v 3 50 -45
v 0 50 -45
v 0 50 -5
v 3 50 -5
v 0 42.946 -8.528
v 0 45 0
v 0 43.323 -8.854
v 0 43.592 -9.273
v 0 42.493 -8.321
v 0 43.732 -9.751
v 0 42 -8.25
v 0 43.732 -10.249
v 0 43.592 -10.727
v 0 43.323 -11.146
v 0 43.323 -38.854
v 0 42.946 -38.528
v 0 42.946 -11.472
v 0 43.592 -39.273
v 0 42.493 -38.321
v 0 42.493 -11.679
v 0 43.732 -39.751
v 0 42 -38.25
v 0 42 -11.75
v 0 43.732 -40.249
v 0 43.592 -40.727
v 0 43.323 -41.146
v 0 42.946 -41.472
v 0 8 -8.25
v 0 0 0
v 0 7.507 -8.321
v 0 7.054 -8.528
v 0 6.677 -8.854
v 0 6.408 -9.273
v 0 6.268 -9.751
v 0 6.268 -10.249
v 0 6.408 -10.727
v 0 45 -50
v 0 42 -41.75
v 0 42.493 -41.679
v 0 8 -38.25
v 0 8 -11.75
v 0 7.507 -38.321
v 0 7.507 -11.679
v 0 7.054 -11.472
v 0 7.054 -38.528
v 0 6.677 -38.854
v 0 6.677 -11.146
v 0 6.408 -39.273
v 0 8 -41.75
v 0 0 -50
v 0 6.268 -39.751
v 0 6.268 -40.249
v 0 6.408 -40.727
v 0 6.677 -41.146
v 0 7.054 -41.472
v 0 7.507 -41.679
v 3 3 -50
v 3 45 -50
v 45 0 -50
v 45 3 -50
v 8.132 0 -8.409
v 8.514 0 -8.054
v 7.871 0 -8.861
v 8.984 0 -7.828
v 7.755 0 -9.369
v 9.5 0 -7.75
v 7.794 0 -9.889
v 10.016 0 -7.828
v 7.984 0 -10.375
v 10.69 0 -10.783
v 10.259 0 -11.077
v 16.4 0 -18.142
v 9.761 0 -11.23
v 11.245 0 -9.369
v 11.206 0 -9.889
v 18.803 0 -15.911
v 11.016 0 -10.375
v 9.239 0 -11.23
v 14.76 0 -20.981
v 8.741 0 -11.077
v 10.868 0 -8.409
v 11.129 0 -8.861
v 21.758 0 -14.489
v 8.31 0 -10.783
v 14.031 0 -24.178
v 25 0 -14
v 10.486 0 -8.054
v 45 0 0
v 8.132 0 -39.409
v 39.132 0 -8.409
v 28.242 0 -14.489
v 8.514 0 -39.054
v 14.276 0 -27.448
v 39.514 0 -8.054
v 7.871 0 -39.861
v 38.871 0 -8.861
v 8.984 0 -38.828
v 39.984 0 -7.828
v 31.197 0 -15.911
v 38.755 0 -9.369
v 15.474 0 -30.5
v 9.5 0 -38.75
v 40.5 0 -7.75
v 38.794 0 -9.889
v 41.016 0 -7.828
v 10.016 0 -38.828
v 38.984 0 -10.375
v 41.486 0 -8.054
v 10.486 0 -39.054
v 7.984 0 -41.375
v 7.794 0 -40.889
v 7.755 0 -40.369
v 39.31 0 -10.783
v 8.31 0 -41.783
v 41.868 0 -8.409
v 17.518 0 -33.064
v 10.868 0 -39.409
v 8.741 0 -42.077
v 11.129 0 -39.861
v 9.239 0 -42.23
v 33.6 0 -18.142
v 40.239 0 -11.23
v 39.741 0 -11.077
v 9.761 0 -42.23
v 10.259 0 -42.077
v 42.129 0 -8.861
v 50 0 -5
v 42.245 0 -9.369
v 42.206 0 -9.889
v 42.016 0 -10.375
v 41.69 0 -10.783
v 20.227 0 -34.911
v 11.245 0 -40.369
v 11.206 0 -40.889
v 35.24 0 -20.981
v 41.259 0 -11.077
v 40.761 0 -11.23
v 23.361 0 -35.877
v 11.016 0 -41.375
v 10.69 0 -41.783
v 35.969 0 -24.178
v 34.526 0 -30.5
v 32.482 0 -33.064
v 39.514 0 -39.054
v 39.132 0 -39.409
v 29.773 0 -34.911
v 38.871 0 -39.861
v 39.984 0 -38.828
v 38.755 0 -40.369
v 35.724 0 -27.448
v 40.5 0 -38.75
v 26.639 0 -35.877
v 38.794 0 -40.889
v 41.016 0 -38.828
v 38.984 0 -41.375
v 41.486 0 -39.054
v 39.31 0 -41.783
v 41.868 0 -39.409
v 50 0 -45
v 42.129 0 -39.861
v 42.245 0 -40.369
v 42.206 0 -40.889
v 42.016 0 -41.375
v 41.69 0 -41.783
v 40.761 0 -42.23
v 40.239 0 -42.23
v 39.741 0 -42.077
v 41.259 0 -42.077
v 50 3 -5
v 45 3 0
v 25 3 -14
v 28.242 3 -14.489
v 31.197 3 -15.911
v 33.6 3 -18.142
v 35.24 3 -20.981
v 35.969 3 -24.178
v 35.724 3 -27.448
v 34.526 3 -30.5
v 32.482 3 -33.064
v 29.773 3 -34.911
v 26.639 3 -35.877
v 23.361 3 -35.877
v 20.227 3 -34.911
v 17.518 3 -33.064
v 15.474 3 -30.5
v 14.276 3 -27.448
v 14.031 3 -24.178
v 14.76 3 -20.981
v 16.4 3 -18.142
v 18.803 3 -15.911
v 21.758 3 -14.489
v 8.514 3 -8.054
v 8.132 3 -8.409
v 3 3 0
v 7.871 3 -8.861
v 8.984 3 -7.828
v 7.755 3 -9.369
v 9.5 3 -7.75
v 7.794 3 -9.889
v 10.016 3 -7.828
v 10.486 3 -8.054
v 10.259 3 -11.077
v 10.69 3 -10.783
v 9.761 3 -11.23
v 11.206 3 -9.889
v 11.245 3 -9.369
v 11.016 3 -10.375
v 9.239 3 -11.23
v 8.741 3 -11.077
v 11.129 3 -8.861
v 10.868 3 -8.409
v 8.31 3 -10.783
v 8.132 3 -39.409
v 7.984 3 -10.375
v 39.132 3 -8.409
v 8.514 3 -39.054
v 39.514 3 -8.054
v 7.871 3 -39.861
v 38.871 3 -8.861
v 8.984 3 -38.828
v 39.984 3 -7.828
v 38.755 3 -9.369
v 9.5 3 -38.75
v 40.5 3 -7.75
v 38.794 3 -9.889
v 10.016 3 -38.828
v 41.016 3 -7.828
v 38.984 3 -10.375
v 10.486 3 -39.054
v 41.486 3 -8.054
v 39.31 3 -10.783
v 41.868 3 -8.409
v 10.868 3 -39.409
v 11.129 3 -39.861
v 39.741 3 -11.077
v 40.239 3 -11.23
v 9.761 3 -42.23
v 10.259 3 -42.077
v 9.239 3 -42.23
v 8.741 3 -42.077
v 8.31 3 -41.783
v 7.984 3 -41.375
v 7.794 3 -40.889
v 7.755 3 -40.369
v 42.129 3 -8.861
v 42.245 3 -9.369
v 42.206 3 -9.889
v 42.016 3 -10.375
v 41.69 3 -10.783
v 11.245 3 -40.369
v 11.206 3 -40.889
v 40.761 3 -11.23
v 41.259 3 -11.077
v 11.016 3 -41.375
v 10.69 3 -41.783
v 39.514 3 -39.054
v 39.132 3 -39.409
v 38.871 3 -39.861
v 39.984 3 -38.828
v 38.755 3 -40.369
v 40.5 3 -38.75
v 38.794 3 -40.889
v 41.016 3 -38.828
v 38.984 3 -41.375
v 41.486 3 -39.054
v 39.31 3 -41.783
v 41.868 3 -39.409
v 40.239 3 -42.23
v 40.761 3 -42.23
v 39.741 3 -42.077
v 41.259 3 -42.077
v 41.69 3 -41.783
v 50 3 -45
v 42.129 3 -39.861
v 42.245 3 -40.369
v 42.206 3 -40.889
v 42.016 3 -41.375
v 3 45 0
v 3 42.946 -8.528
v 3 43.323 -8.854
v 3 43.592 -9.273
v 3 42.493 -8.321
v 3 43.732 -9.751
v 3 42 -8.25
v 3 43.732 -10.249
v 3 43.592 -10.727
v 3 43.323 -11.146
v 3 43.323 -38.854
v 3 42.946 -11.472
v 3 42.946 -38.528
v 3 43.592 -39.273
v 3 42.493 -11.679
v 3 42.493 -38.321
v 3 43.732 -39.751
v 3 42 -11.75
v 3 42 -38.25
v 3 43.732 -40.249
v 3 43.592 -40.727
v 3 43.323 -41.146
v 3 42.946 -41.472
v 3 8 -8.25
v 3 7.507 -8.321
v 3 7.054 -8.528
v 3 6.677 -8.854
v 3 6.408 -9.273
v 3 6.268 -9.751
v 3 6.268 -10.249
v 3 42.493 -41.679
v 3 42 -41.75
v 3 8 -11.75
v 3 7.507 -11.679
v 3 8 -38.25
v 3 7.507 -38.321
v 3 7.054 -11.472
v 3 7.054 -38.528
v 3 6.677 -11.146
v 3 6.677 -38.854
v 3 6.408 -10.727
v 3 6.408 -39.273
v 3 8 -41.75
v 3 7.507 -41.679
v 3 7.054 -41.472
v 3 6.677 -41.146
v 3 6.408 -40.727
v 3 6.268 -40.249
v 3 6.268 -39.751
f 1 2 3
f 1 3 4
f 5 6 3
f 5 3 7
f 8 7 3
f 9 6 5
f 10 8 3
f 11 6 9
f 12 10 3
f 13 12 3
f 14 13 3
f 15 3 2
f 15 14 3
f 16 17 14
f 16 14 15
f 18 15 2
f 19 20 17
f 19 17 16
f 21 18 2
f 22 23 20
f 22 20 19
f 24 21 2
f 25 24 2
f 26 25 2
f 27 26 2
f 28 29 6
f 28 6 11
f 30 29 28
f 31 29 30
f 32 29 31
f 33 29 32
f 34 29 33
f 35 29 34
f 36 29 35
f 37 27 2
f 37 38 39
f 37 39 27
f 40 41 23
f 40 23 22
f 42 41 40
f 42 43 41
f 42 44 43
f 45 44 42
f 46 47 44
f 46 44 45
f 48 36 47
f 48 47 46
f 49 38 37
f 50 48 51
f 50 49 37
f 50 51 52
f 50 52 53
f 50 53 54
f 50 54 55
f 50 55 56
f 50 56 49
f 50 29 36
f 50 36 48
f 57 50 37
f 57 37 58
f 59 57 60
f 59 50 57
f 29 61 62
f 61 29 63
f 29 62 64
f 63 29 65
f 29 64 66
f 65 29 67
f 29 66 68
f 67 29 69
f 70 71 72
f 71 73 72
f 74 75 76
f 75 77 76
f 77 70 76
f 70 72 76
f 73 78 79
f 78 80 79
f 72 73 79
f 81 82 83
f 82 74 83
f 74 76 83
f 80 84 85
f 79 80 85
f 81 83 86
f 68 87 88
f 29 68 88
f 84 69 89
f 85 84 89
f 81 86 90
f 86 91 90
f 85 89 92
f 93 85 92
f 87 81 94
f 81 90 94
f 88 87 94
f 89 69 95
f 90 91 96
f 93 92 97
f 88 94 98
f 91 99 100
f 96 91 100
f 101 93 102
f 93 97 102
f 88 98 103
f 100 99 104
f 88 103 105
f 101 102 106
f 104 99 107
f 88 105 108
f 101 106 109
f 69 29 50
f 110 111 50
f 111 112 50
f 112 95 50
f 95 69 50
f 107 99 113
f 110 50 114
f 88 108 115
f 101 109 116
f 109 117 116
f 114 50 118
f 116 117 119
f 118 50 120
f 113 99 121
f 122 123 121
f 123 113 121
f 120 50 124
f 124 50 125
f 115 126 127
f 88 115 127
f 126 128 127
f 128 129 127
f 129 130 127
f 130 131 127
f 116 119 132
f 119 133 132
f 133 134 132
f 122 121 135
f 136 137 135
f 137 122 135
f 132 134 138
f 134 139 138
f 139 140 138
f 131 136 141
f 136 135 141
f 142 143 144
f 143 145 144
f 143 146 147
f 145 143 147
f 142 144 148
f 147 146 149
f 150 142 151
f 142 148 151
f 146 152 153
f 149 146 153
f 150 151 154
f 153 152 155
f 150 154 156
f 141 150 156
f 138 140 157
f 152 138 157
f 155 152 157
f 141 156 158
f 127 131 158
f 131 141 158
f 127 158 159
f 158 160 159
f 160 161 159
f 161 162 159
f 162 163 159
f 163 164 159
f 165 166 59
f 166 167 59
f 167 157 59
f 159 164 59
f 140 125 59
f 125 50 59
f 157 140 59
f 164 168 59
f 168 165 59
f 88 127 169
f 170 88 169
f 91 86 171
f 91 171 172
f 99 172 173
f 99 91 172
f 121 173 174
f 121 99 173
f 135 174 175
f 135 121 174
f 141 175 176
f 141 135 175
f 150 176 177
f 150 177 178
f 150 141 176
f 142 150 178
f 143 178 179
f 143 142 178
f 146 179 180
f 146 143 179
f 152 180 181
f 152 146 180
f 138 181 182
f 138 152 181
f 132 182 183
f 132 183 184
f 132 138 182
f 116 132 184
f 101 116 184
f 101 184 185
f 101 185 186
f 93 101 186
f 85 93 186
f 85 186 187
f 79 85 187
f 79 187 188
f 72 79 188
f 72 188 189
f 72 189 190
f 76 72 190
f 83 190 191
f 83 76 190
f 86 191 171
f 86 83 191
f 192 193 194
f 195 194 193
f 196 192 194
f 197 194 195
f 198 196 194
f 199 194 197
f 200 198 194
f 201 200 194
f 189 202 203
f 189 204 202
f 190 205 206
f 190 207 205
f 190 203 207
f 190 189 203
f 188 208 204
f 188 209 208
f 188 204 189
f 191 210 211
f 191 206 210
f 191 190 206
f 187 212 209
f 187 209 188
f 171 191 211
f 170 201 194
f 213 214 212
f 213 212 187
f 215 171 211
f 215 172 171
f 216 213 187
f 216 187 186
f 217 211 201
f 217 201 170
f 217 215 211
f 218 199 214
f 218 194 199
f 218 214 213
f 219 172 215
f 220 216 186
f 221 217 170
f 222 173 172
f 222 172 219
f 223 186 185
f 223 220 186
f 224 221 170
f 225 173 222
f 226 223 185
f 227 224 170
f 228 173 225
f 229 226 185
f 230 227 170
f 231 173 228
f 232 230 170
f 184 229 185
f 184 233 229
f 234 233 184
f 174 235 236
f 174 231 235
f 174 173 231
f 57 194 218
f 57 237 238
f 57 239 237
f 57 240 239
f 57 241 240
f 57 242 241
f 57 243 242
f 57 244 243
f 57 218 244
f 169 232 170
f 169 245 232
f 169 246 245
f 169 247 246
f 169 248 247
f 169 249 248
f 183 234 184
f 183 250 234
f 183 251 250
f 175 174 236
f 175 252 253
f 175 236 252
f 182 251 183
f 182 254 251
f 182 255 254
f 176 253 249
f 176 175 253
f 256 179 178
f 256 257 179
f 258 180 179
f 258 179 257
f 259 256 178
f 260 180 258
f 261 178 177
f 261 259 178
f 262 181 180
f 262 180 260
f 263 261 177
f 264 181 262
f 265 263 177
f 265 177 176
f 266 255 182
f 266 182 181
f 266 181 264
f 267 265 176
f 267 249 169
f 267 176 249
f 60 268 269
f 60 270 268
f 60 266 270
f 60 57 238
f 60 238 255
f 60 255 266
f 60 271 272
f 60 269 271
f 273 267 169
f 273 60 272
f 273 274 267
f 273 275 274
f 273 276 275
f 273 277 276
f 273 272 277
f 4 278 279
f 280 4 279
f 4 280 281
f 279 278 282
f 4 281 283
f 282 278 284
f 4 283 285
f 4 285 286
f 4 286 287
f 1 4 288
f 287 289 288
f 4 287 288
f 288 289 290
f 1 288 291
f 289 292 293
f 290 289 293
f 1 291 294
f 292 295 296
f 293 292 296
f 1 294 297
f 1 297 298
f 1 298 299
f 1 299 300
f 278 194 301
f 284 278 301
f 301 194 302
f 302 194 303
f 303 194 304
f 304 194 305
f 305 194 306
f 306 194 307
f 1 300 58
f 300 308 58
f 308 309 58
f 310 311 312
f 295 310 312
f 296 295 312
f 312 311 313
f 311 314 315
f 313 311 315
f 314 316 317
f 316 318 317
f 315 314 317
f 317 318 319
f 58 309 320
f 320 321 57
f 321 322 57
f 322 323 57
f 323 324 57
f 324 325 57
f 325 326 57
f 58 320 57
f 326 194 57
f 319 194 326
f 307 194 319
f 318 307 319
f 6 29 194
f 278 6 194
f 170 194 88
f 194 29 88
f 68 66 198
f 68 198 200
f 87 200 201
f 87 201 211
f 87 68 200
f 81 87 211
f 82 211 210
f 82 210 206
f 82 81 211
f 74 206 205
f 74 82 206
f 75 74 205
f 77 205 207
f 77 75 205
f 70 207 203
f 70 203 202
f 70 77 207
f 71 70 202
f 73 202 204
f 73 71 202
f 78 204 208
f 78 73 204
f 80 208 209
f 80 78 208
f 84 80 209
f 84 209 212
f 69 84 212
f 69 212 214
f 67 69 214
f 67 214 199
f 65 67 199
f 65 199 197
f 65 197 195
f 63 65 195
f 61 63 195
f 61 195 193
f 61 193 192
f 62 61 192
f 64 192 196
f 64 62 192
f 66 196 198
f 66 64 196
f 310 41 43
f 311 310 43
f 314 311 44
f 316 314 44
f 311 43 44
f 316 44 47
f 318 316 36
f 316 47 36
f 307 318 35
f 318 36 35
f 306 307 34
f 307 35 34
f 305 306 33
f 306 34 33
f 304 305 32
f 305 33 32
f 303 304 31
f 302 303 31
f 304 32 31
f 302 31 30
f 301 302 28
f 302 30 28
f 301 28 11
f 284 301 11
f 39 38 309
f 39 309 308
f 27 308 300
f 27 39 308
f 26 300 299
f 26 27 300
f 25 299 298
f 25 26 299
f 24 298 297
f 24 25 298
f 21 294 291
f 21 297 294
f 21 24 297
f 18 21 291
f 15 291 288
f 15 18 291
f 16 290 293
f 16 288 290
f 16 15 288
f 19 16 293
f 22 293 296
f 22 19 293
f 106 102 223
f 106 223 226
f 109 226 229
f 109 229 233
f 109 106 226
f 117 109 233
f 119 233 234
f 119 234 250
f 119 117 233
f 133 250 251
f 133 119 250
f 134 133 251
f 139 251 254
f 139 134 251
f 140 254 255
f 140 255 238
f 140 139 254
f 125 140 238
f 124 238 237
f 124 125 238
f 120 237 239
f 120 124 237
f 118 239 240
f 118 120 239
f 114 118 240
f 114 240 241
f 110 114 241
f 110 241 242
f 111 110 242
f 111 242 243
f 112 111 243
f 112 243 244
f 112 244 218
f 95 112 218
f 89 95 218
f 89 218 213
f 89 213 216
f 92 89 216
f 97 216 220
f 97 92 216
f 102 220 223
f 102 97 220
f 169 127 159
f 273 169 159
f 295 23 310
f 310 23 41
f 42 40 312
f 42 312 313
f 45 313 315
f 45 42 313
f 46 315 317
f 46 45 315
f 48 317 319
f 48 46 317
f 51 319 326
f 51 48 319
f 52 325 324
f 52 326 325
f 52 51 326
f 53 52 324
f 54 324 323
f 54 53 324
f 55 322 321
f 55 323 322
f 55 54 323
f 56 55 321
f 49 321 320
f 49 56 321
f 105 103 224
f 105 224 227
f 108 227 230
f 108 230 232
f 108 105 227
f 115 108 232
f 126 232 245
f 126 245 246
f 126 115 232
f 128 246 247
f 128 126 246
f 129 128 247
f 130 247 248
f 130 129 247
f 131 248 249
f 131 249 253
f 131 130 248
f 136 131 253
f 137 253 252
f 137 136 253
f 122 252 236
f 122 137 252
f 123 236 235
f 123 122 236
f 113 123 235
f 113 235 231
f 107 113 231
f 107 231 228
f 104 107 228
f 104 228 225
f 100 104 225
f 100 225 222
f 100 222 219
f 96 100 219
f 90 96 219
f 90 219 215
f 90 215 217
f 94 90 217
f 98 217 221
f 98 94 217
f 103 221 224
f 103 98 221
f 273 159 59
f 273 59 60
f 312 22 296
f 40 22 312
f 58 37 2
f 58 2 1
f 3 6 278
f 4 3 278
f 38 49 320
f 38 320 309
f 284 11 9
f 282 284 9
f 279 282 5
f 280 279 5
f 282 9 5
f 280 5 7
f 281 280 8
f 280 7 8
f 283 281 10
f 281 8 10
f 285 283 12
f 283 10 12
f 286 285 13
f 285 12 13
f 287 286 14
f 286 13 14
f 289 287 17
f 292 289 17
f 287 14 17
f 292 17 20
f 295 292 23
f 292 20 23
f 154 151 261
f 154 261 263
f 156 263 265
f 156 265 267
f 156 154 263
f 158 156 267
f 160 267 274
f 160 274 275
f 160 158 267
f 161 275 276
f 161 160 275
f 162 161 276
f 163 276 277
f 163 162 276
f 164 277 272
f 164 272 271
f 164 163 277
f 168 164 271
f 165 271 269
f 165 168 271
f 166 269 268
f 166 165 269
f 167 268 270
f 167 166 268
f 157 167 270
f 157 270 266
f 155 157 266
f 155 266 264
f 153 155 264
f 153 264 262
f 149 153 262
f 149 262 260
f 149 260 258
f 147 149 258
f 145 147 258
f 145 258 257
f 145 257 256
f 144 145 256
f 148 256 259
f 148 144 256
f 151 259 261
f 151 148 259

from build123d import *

# Parameters (mm, degrees)
SKETCH1_W           = 50
SKETCH1_H           = 50
SKETCH1_R           = 11
SKETCH1_R_2         = 1.75
BOSS_EXTRUDE1_DEPTH = 3
SKETCH2_W           = 3
SKETCH2_H           = 50
BOSS_EXTRUDE2_DEPTH = 47
CUT_EXTRUDE1_REACH  = 88.603
CHAMFER1_SIZE       = 5
CHAMFER2_SIZE       = 5


with BuildPart() as part:
    # Sketch1 → Boss-Extrude1 (new body)
    with BuildSketch(Plane(origin=(0, 0, 0), x_dir=(1, 0, 0), z_dir=(0, 1, 0))):
        with Locations((25, 25)):
            Rectangle(SKETCH1_W, SKETCH1_H)
        with Locations(Location((25, 25, 0), (0, 0, 270))):
            Circle(SKETCH1_R, mode=Mode.SUBTRACT)
        with Locations(Location((40.5, 40.5, 0), (0, 0, 270))):
            Circle(SKETCH1_R_2, mode=Mode.SUBTRACT)
        with Locations(Location((9.5, 40.5, 0), (0, 0, 270))):
            Circle(SKETCH1_R_2, mode=Mode.SUBTRACT)
        with Locations(Location((9.5, 9.5, 0), (0, 0, 270))):
            Circle(SKETCH1_R_2, mode=Mode.SUBTRACT)
        with Locations(Location((40.5, 9.5, 0), (0, 0, 270))):
            Circle(SKETCH1_R_2, mode=Mode.SUBTRACT)
    extrude(amount=BOSS_EXTRUDE1_DEPTH)

    # Sketch2 → Boss-Extrude2 (add)
    with BuildSketch(Plane(origin=(0, 3, 0), x_dir=(1, 0, 0), z_dir=(0, 1, 0))):
        with Locations((1.5, 25)):
            Rectangle(SKETCH2_W, SKETCH2_H)
    extrude(amount=BOSS_EXTRUDE2_DEPTH)

    # Sketch3 → Cut-Extrude1 (cut, up to next)
    with BuildSketch(Plane.ZY, mode=Mode.PRIVATE) as cut_extrude1_sk1:
        with BuildLine():
            Line((-38.25, 42), (-38.25, 8))
            ThreePointArc((-38.25, 8), (-40, 6.25), (-41.75, 8))
            Line((-41.75, 8), (-41.75, 42))
            ThreePointArc((-41.75, 42), (-40, 43.75), (-38.25, 42))
        make_face()
    cut_extrude1_tool1 = extrude(cut_extrude1_sk1.sketch, amount=-CUT_EXTRUDE1_REACH, mode=Mode.PRIVATE) & part.part
    # Sketch3 → Cut-Extrude1 (cut, up to next)
    with BuildSketch(Plane.ZY, mode=Mode.PRIVATE) as cut_extrude1_sk2:
        with BuildLine():
            Line((-11.75, 42), (-11.75, 8))
            ThreePointArc((-11.75, 8), (-10, 6.25), (-8.25, 8))
            Line((-8.25, 8), (-8.25, 42))
            ThreePointArc((-8.25, 42), (-10, 43.75), (-11.75, 42))
        make_face()
    cut_extrude1_tool2 = extrude(cut_extrude1_sk2.sketch, amount=-CUT_EXTRUDE1_REACH, mode=Mode.PRIVATE) & part.part
    add(cut_extrude1_tool1.solids().sort_by_distance((0, 25, -40))[0], mode=Mode.SUBTRACT)
    add(cut_extrude1_tool2.solids().sort_by_distance((0, 25, -10))[0], mode=Mode.SUBTRACT)

    # Chamfer1
    chamfer1_edges = [part.edges().sort_by_distance(p)[0] for p in [
        (1.5, 50, 0),
        (1.5, 50, -50),
    ]]
    chamfer(chamfer1_edges, length=CHAMFER1_SIZE)

    # Chamfer2
    chamfer2_edges = [part.edges().sort_by_distance(p)[0] for p in [
        (50, 1.5, -50),
        (50, 1.5, 0),
    ]]
    chamfer(chamfer2_edges, length=CHAMFER2_SIZE)


solid = part.part
